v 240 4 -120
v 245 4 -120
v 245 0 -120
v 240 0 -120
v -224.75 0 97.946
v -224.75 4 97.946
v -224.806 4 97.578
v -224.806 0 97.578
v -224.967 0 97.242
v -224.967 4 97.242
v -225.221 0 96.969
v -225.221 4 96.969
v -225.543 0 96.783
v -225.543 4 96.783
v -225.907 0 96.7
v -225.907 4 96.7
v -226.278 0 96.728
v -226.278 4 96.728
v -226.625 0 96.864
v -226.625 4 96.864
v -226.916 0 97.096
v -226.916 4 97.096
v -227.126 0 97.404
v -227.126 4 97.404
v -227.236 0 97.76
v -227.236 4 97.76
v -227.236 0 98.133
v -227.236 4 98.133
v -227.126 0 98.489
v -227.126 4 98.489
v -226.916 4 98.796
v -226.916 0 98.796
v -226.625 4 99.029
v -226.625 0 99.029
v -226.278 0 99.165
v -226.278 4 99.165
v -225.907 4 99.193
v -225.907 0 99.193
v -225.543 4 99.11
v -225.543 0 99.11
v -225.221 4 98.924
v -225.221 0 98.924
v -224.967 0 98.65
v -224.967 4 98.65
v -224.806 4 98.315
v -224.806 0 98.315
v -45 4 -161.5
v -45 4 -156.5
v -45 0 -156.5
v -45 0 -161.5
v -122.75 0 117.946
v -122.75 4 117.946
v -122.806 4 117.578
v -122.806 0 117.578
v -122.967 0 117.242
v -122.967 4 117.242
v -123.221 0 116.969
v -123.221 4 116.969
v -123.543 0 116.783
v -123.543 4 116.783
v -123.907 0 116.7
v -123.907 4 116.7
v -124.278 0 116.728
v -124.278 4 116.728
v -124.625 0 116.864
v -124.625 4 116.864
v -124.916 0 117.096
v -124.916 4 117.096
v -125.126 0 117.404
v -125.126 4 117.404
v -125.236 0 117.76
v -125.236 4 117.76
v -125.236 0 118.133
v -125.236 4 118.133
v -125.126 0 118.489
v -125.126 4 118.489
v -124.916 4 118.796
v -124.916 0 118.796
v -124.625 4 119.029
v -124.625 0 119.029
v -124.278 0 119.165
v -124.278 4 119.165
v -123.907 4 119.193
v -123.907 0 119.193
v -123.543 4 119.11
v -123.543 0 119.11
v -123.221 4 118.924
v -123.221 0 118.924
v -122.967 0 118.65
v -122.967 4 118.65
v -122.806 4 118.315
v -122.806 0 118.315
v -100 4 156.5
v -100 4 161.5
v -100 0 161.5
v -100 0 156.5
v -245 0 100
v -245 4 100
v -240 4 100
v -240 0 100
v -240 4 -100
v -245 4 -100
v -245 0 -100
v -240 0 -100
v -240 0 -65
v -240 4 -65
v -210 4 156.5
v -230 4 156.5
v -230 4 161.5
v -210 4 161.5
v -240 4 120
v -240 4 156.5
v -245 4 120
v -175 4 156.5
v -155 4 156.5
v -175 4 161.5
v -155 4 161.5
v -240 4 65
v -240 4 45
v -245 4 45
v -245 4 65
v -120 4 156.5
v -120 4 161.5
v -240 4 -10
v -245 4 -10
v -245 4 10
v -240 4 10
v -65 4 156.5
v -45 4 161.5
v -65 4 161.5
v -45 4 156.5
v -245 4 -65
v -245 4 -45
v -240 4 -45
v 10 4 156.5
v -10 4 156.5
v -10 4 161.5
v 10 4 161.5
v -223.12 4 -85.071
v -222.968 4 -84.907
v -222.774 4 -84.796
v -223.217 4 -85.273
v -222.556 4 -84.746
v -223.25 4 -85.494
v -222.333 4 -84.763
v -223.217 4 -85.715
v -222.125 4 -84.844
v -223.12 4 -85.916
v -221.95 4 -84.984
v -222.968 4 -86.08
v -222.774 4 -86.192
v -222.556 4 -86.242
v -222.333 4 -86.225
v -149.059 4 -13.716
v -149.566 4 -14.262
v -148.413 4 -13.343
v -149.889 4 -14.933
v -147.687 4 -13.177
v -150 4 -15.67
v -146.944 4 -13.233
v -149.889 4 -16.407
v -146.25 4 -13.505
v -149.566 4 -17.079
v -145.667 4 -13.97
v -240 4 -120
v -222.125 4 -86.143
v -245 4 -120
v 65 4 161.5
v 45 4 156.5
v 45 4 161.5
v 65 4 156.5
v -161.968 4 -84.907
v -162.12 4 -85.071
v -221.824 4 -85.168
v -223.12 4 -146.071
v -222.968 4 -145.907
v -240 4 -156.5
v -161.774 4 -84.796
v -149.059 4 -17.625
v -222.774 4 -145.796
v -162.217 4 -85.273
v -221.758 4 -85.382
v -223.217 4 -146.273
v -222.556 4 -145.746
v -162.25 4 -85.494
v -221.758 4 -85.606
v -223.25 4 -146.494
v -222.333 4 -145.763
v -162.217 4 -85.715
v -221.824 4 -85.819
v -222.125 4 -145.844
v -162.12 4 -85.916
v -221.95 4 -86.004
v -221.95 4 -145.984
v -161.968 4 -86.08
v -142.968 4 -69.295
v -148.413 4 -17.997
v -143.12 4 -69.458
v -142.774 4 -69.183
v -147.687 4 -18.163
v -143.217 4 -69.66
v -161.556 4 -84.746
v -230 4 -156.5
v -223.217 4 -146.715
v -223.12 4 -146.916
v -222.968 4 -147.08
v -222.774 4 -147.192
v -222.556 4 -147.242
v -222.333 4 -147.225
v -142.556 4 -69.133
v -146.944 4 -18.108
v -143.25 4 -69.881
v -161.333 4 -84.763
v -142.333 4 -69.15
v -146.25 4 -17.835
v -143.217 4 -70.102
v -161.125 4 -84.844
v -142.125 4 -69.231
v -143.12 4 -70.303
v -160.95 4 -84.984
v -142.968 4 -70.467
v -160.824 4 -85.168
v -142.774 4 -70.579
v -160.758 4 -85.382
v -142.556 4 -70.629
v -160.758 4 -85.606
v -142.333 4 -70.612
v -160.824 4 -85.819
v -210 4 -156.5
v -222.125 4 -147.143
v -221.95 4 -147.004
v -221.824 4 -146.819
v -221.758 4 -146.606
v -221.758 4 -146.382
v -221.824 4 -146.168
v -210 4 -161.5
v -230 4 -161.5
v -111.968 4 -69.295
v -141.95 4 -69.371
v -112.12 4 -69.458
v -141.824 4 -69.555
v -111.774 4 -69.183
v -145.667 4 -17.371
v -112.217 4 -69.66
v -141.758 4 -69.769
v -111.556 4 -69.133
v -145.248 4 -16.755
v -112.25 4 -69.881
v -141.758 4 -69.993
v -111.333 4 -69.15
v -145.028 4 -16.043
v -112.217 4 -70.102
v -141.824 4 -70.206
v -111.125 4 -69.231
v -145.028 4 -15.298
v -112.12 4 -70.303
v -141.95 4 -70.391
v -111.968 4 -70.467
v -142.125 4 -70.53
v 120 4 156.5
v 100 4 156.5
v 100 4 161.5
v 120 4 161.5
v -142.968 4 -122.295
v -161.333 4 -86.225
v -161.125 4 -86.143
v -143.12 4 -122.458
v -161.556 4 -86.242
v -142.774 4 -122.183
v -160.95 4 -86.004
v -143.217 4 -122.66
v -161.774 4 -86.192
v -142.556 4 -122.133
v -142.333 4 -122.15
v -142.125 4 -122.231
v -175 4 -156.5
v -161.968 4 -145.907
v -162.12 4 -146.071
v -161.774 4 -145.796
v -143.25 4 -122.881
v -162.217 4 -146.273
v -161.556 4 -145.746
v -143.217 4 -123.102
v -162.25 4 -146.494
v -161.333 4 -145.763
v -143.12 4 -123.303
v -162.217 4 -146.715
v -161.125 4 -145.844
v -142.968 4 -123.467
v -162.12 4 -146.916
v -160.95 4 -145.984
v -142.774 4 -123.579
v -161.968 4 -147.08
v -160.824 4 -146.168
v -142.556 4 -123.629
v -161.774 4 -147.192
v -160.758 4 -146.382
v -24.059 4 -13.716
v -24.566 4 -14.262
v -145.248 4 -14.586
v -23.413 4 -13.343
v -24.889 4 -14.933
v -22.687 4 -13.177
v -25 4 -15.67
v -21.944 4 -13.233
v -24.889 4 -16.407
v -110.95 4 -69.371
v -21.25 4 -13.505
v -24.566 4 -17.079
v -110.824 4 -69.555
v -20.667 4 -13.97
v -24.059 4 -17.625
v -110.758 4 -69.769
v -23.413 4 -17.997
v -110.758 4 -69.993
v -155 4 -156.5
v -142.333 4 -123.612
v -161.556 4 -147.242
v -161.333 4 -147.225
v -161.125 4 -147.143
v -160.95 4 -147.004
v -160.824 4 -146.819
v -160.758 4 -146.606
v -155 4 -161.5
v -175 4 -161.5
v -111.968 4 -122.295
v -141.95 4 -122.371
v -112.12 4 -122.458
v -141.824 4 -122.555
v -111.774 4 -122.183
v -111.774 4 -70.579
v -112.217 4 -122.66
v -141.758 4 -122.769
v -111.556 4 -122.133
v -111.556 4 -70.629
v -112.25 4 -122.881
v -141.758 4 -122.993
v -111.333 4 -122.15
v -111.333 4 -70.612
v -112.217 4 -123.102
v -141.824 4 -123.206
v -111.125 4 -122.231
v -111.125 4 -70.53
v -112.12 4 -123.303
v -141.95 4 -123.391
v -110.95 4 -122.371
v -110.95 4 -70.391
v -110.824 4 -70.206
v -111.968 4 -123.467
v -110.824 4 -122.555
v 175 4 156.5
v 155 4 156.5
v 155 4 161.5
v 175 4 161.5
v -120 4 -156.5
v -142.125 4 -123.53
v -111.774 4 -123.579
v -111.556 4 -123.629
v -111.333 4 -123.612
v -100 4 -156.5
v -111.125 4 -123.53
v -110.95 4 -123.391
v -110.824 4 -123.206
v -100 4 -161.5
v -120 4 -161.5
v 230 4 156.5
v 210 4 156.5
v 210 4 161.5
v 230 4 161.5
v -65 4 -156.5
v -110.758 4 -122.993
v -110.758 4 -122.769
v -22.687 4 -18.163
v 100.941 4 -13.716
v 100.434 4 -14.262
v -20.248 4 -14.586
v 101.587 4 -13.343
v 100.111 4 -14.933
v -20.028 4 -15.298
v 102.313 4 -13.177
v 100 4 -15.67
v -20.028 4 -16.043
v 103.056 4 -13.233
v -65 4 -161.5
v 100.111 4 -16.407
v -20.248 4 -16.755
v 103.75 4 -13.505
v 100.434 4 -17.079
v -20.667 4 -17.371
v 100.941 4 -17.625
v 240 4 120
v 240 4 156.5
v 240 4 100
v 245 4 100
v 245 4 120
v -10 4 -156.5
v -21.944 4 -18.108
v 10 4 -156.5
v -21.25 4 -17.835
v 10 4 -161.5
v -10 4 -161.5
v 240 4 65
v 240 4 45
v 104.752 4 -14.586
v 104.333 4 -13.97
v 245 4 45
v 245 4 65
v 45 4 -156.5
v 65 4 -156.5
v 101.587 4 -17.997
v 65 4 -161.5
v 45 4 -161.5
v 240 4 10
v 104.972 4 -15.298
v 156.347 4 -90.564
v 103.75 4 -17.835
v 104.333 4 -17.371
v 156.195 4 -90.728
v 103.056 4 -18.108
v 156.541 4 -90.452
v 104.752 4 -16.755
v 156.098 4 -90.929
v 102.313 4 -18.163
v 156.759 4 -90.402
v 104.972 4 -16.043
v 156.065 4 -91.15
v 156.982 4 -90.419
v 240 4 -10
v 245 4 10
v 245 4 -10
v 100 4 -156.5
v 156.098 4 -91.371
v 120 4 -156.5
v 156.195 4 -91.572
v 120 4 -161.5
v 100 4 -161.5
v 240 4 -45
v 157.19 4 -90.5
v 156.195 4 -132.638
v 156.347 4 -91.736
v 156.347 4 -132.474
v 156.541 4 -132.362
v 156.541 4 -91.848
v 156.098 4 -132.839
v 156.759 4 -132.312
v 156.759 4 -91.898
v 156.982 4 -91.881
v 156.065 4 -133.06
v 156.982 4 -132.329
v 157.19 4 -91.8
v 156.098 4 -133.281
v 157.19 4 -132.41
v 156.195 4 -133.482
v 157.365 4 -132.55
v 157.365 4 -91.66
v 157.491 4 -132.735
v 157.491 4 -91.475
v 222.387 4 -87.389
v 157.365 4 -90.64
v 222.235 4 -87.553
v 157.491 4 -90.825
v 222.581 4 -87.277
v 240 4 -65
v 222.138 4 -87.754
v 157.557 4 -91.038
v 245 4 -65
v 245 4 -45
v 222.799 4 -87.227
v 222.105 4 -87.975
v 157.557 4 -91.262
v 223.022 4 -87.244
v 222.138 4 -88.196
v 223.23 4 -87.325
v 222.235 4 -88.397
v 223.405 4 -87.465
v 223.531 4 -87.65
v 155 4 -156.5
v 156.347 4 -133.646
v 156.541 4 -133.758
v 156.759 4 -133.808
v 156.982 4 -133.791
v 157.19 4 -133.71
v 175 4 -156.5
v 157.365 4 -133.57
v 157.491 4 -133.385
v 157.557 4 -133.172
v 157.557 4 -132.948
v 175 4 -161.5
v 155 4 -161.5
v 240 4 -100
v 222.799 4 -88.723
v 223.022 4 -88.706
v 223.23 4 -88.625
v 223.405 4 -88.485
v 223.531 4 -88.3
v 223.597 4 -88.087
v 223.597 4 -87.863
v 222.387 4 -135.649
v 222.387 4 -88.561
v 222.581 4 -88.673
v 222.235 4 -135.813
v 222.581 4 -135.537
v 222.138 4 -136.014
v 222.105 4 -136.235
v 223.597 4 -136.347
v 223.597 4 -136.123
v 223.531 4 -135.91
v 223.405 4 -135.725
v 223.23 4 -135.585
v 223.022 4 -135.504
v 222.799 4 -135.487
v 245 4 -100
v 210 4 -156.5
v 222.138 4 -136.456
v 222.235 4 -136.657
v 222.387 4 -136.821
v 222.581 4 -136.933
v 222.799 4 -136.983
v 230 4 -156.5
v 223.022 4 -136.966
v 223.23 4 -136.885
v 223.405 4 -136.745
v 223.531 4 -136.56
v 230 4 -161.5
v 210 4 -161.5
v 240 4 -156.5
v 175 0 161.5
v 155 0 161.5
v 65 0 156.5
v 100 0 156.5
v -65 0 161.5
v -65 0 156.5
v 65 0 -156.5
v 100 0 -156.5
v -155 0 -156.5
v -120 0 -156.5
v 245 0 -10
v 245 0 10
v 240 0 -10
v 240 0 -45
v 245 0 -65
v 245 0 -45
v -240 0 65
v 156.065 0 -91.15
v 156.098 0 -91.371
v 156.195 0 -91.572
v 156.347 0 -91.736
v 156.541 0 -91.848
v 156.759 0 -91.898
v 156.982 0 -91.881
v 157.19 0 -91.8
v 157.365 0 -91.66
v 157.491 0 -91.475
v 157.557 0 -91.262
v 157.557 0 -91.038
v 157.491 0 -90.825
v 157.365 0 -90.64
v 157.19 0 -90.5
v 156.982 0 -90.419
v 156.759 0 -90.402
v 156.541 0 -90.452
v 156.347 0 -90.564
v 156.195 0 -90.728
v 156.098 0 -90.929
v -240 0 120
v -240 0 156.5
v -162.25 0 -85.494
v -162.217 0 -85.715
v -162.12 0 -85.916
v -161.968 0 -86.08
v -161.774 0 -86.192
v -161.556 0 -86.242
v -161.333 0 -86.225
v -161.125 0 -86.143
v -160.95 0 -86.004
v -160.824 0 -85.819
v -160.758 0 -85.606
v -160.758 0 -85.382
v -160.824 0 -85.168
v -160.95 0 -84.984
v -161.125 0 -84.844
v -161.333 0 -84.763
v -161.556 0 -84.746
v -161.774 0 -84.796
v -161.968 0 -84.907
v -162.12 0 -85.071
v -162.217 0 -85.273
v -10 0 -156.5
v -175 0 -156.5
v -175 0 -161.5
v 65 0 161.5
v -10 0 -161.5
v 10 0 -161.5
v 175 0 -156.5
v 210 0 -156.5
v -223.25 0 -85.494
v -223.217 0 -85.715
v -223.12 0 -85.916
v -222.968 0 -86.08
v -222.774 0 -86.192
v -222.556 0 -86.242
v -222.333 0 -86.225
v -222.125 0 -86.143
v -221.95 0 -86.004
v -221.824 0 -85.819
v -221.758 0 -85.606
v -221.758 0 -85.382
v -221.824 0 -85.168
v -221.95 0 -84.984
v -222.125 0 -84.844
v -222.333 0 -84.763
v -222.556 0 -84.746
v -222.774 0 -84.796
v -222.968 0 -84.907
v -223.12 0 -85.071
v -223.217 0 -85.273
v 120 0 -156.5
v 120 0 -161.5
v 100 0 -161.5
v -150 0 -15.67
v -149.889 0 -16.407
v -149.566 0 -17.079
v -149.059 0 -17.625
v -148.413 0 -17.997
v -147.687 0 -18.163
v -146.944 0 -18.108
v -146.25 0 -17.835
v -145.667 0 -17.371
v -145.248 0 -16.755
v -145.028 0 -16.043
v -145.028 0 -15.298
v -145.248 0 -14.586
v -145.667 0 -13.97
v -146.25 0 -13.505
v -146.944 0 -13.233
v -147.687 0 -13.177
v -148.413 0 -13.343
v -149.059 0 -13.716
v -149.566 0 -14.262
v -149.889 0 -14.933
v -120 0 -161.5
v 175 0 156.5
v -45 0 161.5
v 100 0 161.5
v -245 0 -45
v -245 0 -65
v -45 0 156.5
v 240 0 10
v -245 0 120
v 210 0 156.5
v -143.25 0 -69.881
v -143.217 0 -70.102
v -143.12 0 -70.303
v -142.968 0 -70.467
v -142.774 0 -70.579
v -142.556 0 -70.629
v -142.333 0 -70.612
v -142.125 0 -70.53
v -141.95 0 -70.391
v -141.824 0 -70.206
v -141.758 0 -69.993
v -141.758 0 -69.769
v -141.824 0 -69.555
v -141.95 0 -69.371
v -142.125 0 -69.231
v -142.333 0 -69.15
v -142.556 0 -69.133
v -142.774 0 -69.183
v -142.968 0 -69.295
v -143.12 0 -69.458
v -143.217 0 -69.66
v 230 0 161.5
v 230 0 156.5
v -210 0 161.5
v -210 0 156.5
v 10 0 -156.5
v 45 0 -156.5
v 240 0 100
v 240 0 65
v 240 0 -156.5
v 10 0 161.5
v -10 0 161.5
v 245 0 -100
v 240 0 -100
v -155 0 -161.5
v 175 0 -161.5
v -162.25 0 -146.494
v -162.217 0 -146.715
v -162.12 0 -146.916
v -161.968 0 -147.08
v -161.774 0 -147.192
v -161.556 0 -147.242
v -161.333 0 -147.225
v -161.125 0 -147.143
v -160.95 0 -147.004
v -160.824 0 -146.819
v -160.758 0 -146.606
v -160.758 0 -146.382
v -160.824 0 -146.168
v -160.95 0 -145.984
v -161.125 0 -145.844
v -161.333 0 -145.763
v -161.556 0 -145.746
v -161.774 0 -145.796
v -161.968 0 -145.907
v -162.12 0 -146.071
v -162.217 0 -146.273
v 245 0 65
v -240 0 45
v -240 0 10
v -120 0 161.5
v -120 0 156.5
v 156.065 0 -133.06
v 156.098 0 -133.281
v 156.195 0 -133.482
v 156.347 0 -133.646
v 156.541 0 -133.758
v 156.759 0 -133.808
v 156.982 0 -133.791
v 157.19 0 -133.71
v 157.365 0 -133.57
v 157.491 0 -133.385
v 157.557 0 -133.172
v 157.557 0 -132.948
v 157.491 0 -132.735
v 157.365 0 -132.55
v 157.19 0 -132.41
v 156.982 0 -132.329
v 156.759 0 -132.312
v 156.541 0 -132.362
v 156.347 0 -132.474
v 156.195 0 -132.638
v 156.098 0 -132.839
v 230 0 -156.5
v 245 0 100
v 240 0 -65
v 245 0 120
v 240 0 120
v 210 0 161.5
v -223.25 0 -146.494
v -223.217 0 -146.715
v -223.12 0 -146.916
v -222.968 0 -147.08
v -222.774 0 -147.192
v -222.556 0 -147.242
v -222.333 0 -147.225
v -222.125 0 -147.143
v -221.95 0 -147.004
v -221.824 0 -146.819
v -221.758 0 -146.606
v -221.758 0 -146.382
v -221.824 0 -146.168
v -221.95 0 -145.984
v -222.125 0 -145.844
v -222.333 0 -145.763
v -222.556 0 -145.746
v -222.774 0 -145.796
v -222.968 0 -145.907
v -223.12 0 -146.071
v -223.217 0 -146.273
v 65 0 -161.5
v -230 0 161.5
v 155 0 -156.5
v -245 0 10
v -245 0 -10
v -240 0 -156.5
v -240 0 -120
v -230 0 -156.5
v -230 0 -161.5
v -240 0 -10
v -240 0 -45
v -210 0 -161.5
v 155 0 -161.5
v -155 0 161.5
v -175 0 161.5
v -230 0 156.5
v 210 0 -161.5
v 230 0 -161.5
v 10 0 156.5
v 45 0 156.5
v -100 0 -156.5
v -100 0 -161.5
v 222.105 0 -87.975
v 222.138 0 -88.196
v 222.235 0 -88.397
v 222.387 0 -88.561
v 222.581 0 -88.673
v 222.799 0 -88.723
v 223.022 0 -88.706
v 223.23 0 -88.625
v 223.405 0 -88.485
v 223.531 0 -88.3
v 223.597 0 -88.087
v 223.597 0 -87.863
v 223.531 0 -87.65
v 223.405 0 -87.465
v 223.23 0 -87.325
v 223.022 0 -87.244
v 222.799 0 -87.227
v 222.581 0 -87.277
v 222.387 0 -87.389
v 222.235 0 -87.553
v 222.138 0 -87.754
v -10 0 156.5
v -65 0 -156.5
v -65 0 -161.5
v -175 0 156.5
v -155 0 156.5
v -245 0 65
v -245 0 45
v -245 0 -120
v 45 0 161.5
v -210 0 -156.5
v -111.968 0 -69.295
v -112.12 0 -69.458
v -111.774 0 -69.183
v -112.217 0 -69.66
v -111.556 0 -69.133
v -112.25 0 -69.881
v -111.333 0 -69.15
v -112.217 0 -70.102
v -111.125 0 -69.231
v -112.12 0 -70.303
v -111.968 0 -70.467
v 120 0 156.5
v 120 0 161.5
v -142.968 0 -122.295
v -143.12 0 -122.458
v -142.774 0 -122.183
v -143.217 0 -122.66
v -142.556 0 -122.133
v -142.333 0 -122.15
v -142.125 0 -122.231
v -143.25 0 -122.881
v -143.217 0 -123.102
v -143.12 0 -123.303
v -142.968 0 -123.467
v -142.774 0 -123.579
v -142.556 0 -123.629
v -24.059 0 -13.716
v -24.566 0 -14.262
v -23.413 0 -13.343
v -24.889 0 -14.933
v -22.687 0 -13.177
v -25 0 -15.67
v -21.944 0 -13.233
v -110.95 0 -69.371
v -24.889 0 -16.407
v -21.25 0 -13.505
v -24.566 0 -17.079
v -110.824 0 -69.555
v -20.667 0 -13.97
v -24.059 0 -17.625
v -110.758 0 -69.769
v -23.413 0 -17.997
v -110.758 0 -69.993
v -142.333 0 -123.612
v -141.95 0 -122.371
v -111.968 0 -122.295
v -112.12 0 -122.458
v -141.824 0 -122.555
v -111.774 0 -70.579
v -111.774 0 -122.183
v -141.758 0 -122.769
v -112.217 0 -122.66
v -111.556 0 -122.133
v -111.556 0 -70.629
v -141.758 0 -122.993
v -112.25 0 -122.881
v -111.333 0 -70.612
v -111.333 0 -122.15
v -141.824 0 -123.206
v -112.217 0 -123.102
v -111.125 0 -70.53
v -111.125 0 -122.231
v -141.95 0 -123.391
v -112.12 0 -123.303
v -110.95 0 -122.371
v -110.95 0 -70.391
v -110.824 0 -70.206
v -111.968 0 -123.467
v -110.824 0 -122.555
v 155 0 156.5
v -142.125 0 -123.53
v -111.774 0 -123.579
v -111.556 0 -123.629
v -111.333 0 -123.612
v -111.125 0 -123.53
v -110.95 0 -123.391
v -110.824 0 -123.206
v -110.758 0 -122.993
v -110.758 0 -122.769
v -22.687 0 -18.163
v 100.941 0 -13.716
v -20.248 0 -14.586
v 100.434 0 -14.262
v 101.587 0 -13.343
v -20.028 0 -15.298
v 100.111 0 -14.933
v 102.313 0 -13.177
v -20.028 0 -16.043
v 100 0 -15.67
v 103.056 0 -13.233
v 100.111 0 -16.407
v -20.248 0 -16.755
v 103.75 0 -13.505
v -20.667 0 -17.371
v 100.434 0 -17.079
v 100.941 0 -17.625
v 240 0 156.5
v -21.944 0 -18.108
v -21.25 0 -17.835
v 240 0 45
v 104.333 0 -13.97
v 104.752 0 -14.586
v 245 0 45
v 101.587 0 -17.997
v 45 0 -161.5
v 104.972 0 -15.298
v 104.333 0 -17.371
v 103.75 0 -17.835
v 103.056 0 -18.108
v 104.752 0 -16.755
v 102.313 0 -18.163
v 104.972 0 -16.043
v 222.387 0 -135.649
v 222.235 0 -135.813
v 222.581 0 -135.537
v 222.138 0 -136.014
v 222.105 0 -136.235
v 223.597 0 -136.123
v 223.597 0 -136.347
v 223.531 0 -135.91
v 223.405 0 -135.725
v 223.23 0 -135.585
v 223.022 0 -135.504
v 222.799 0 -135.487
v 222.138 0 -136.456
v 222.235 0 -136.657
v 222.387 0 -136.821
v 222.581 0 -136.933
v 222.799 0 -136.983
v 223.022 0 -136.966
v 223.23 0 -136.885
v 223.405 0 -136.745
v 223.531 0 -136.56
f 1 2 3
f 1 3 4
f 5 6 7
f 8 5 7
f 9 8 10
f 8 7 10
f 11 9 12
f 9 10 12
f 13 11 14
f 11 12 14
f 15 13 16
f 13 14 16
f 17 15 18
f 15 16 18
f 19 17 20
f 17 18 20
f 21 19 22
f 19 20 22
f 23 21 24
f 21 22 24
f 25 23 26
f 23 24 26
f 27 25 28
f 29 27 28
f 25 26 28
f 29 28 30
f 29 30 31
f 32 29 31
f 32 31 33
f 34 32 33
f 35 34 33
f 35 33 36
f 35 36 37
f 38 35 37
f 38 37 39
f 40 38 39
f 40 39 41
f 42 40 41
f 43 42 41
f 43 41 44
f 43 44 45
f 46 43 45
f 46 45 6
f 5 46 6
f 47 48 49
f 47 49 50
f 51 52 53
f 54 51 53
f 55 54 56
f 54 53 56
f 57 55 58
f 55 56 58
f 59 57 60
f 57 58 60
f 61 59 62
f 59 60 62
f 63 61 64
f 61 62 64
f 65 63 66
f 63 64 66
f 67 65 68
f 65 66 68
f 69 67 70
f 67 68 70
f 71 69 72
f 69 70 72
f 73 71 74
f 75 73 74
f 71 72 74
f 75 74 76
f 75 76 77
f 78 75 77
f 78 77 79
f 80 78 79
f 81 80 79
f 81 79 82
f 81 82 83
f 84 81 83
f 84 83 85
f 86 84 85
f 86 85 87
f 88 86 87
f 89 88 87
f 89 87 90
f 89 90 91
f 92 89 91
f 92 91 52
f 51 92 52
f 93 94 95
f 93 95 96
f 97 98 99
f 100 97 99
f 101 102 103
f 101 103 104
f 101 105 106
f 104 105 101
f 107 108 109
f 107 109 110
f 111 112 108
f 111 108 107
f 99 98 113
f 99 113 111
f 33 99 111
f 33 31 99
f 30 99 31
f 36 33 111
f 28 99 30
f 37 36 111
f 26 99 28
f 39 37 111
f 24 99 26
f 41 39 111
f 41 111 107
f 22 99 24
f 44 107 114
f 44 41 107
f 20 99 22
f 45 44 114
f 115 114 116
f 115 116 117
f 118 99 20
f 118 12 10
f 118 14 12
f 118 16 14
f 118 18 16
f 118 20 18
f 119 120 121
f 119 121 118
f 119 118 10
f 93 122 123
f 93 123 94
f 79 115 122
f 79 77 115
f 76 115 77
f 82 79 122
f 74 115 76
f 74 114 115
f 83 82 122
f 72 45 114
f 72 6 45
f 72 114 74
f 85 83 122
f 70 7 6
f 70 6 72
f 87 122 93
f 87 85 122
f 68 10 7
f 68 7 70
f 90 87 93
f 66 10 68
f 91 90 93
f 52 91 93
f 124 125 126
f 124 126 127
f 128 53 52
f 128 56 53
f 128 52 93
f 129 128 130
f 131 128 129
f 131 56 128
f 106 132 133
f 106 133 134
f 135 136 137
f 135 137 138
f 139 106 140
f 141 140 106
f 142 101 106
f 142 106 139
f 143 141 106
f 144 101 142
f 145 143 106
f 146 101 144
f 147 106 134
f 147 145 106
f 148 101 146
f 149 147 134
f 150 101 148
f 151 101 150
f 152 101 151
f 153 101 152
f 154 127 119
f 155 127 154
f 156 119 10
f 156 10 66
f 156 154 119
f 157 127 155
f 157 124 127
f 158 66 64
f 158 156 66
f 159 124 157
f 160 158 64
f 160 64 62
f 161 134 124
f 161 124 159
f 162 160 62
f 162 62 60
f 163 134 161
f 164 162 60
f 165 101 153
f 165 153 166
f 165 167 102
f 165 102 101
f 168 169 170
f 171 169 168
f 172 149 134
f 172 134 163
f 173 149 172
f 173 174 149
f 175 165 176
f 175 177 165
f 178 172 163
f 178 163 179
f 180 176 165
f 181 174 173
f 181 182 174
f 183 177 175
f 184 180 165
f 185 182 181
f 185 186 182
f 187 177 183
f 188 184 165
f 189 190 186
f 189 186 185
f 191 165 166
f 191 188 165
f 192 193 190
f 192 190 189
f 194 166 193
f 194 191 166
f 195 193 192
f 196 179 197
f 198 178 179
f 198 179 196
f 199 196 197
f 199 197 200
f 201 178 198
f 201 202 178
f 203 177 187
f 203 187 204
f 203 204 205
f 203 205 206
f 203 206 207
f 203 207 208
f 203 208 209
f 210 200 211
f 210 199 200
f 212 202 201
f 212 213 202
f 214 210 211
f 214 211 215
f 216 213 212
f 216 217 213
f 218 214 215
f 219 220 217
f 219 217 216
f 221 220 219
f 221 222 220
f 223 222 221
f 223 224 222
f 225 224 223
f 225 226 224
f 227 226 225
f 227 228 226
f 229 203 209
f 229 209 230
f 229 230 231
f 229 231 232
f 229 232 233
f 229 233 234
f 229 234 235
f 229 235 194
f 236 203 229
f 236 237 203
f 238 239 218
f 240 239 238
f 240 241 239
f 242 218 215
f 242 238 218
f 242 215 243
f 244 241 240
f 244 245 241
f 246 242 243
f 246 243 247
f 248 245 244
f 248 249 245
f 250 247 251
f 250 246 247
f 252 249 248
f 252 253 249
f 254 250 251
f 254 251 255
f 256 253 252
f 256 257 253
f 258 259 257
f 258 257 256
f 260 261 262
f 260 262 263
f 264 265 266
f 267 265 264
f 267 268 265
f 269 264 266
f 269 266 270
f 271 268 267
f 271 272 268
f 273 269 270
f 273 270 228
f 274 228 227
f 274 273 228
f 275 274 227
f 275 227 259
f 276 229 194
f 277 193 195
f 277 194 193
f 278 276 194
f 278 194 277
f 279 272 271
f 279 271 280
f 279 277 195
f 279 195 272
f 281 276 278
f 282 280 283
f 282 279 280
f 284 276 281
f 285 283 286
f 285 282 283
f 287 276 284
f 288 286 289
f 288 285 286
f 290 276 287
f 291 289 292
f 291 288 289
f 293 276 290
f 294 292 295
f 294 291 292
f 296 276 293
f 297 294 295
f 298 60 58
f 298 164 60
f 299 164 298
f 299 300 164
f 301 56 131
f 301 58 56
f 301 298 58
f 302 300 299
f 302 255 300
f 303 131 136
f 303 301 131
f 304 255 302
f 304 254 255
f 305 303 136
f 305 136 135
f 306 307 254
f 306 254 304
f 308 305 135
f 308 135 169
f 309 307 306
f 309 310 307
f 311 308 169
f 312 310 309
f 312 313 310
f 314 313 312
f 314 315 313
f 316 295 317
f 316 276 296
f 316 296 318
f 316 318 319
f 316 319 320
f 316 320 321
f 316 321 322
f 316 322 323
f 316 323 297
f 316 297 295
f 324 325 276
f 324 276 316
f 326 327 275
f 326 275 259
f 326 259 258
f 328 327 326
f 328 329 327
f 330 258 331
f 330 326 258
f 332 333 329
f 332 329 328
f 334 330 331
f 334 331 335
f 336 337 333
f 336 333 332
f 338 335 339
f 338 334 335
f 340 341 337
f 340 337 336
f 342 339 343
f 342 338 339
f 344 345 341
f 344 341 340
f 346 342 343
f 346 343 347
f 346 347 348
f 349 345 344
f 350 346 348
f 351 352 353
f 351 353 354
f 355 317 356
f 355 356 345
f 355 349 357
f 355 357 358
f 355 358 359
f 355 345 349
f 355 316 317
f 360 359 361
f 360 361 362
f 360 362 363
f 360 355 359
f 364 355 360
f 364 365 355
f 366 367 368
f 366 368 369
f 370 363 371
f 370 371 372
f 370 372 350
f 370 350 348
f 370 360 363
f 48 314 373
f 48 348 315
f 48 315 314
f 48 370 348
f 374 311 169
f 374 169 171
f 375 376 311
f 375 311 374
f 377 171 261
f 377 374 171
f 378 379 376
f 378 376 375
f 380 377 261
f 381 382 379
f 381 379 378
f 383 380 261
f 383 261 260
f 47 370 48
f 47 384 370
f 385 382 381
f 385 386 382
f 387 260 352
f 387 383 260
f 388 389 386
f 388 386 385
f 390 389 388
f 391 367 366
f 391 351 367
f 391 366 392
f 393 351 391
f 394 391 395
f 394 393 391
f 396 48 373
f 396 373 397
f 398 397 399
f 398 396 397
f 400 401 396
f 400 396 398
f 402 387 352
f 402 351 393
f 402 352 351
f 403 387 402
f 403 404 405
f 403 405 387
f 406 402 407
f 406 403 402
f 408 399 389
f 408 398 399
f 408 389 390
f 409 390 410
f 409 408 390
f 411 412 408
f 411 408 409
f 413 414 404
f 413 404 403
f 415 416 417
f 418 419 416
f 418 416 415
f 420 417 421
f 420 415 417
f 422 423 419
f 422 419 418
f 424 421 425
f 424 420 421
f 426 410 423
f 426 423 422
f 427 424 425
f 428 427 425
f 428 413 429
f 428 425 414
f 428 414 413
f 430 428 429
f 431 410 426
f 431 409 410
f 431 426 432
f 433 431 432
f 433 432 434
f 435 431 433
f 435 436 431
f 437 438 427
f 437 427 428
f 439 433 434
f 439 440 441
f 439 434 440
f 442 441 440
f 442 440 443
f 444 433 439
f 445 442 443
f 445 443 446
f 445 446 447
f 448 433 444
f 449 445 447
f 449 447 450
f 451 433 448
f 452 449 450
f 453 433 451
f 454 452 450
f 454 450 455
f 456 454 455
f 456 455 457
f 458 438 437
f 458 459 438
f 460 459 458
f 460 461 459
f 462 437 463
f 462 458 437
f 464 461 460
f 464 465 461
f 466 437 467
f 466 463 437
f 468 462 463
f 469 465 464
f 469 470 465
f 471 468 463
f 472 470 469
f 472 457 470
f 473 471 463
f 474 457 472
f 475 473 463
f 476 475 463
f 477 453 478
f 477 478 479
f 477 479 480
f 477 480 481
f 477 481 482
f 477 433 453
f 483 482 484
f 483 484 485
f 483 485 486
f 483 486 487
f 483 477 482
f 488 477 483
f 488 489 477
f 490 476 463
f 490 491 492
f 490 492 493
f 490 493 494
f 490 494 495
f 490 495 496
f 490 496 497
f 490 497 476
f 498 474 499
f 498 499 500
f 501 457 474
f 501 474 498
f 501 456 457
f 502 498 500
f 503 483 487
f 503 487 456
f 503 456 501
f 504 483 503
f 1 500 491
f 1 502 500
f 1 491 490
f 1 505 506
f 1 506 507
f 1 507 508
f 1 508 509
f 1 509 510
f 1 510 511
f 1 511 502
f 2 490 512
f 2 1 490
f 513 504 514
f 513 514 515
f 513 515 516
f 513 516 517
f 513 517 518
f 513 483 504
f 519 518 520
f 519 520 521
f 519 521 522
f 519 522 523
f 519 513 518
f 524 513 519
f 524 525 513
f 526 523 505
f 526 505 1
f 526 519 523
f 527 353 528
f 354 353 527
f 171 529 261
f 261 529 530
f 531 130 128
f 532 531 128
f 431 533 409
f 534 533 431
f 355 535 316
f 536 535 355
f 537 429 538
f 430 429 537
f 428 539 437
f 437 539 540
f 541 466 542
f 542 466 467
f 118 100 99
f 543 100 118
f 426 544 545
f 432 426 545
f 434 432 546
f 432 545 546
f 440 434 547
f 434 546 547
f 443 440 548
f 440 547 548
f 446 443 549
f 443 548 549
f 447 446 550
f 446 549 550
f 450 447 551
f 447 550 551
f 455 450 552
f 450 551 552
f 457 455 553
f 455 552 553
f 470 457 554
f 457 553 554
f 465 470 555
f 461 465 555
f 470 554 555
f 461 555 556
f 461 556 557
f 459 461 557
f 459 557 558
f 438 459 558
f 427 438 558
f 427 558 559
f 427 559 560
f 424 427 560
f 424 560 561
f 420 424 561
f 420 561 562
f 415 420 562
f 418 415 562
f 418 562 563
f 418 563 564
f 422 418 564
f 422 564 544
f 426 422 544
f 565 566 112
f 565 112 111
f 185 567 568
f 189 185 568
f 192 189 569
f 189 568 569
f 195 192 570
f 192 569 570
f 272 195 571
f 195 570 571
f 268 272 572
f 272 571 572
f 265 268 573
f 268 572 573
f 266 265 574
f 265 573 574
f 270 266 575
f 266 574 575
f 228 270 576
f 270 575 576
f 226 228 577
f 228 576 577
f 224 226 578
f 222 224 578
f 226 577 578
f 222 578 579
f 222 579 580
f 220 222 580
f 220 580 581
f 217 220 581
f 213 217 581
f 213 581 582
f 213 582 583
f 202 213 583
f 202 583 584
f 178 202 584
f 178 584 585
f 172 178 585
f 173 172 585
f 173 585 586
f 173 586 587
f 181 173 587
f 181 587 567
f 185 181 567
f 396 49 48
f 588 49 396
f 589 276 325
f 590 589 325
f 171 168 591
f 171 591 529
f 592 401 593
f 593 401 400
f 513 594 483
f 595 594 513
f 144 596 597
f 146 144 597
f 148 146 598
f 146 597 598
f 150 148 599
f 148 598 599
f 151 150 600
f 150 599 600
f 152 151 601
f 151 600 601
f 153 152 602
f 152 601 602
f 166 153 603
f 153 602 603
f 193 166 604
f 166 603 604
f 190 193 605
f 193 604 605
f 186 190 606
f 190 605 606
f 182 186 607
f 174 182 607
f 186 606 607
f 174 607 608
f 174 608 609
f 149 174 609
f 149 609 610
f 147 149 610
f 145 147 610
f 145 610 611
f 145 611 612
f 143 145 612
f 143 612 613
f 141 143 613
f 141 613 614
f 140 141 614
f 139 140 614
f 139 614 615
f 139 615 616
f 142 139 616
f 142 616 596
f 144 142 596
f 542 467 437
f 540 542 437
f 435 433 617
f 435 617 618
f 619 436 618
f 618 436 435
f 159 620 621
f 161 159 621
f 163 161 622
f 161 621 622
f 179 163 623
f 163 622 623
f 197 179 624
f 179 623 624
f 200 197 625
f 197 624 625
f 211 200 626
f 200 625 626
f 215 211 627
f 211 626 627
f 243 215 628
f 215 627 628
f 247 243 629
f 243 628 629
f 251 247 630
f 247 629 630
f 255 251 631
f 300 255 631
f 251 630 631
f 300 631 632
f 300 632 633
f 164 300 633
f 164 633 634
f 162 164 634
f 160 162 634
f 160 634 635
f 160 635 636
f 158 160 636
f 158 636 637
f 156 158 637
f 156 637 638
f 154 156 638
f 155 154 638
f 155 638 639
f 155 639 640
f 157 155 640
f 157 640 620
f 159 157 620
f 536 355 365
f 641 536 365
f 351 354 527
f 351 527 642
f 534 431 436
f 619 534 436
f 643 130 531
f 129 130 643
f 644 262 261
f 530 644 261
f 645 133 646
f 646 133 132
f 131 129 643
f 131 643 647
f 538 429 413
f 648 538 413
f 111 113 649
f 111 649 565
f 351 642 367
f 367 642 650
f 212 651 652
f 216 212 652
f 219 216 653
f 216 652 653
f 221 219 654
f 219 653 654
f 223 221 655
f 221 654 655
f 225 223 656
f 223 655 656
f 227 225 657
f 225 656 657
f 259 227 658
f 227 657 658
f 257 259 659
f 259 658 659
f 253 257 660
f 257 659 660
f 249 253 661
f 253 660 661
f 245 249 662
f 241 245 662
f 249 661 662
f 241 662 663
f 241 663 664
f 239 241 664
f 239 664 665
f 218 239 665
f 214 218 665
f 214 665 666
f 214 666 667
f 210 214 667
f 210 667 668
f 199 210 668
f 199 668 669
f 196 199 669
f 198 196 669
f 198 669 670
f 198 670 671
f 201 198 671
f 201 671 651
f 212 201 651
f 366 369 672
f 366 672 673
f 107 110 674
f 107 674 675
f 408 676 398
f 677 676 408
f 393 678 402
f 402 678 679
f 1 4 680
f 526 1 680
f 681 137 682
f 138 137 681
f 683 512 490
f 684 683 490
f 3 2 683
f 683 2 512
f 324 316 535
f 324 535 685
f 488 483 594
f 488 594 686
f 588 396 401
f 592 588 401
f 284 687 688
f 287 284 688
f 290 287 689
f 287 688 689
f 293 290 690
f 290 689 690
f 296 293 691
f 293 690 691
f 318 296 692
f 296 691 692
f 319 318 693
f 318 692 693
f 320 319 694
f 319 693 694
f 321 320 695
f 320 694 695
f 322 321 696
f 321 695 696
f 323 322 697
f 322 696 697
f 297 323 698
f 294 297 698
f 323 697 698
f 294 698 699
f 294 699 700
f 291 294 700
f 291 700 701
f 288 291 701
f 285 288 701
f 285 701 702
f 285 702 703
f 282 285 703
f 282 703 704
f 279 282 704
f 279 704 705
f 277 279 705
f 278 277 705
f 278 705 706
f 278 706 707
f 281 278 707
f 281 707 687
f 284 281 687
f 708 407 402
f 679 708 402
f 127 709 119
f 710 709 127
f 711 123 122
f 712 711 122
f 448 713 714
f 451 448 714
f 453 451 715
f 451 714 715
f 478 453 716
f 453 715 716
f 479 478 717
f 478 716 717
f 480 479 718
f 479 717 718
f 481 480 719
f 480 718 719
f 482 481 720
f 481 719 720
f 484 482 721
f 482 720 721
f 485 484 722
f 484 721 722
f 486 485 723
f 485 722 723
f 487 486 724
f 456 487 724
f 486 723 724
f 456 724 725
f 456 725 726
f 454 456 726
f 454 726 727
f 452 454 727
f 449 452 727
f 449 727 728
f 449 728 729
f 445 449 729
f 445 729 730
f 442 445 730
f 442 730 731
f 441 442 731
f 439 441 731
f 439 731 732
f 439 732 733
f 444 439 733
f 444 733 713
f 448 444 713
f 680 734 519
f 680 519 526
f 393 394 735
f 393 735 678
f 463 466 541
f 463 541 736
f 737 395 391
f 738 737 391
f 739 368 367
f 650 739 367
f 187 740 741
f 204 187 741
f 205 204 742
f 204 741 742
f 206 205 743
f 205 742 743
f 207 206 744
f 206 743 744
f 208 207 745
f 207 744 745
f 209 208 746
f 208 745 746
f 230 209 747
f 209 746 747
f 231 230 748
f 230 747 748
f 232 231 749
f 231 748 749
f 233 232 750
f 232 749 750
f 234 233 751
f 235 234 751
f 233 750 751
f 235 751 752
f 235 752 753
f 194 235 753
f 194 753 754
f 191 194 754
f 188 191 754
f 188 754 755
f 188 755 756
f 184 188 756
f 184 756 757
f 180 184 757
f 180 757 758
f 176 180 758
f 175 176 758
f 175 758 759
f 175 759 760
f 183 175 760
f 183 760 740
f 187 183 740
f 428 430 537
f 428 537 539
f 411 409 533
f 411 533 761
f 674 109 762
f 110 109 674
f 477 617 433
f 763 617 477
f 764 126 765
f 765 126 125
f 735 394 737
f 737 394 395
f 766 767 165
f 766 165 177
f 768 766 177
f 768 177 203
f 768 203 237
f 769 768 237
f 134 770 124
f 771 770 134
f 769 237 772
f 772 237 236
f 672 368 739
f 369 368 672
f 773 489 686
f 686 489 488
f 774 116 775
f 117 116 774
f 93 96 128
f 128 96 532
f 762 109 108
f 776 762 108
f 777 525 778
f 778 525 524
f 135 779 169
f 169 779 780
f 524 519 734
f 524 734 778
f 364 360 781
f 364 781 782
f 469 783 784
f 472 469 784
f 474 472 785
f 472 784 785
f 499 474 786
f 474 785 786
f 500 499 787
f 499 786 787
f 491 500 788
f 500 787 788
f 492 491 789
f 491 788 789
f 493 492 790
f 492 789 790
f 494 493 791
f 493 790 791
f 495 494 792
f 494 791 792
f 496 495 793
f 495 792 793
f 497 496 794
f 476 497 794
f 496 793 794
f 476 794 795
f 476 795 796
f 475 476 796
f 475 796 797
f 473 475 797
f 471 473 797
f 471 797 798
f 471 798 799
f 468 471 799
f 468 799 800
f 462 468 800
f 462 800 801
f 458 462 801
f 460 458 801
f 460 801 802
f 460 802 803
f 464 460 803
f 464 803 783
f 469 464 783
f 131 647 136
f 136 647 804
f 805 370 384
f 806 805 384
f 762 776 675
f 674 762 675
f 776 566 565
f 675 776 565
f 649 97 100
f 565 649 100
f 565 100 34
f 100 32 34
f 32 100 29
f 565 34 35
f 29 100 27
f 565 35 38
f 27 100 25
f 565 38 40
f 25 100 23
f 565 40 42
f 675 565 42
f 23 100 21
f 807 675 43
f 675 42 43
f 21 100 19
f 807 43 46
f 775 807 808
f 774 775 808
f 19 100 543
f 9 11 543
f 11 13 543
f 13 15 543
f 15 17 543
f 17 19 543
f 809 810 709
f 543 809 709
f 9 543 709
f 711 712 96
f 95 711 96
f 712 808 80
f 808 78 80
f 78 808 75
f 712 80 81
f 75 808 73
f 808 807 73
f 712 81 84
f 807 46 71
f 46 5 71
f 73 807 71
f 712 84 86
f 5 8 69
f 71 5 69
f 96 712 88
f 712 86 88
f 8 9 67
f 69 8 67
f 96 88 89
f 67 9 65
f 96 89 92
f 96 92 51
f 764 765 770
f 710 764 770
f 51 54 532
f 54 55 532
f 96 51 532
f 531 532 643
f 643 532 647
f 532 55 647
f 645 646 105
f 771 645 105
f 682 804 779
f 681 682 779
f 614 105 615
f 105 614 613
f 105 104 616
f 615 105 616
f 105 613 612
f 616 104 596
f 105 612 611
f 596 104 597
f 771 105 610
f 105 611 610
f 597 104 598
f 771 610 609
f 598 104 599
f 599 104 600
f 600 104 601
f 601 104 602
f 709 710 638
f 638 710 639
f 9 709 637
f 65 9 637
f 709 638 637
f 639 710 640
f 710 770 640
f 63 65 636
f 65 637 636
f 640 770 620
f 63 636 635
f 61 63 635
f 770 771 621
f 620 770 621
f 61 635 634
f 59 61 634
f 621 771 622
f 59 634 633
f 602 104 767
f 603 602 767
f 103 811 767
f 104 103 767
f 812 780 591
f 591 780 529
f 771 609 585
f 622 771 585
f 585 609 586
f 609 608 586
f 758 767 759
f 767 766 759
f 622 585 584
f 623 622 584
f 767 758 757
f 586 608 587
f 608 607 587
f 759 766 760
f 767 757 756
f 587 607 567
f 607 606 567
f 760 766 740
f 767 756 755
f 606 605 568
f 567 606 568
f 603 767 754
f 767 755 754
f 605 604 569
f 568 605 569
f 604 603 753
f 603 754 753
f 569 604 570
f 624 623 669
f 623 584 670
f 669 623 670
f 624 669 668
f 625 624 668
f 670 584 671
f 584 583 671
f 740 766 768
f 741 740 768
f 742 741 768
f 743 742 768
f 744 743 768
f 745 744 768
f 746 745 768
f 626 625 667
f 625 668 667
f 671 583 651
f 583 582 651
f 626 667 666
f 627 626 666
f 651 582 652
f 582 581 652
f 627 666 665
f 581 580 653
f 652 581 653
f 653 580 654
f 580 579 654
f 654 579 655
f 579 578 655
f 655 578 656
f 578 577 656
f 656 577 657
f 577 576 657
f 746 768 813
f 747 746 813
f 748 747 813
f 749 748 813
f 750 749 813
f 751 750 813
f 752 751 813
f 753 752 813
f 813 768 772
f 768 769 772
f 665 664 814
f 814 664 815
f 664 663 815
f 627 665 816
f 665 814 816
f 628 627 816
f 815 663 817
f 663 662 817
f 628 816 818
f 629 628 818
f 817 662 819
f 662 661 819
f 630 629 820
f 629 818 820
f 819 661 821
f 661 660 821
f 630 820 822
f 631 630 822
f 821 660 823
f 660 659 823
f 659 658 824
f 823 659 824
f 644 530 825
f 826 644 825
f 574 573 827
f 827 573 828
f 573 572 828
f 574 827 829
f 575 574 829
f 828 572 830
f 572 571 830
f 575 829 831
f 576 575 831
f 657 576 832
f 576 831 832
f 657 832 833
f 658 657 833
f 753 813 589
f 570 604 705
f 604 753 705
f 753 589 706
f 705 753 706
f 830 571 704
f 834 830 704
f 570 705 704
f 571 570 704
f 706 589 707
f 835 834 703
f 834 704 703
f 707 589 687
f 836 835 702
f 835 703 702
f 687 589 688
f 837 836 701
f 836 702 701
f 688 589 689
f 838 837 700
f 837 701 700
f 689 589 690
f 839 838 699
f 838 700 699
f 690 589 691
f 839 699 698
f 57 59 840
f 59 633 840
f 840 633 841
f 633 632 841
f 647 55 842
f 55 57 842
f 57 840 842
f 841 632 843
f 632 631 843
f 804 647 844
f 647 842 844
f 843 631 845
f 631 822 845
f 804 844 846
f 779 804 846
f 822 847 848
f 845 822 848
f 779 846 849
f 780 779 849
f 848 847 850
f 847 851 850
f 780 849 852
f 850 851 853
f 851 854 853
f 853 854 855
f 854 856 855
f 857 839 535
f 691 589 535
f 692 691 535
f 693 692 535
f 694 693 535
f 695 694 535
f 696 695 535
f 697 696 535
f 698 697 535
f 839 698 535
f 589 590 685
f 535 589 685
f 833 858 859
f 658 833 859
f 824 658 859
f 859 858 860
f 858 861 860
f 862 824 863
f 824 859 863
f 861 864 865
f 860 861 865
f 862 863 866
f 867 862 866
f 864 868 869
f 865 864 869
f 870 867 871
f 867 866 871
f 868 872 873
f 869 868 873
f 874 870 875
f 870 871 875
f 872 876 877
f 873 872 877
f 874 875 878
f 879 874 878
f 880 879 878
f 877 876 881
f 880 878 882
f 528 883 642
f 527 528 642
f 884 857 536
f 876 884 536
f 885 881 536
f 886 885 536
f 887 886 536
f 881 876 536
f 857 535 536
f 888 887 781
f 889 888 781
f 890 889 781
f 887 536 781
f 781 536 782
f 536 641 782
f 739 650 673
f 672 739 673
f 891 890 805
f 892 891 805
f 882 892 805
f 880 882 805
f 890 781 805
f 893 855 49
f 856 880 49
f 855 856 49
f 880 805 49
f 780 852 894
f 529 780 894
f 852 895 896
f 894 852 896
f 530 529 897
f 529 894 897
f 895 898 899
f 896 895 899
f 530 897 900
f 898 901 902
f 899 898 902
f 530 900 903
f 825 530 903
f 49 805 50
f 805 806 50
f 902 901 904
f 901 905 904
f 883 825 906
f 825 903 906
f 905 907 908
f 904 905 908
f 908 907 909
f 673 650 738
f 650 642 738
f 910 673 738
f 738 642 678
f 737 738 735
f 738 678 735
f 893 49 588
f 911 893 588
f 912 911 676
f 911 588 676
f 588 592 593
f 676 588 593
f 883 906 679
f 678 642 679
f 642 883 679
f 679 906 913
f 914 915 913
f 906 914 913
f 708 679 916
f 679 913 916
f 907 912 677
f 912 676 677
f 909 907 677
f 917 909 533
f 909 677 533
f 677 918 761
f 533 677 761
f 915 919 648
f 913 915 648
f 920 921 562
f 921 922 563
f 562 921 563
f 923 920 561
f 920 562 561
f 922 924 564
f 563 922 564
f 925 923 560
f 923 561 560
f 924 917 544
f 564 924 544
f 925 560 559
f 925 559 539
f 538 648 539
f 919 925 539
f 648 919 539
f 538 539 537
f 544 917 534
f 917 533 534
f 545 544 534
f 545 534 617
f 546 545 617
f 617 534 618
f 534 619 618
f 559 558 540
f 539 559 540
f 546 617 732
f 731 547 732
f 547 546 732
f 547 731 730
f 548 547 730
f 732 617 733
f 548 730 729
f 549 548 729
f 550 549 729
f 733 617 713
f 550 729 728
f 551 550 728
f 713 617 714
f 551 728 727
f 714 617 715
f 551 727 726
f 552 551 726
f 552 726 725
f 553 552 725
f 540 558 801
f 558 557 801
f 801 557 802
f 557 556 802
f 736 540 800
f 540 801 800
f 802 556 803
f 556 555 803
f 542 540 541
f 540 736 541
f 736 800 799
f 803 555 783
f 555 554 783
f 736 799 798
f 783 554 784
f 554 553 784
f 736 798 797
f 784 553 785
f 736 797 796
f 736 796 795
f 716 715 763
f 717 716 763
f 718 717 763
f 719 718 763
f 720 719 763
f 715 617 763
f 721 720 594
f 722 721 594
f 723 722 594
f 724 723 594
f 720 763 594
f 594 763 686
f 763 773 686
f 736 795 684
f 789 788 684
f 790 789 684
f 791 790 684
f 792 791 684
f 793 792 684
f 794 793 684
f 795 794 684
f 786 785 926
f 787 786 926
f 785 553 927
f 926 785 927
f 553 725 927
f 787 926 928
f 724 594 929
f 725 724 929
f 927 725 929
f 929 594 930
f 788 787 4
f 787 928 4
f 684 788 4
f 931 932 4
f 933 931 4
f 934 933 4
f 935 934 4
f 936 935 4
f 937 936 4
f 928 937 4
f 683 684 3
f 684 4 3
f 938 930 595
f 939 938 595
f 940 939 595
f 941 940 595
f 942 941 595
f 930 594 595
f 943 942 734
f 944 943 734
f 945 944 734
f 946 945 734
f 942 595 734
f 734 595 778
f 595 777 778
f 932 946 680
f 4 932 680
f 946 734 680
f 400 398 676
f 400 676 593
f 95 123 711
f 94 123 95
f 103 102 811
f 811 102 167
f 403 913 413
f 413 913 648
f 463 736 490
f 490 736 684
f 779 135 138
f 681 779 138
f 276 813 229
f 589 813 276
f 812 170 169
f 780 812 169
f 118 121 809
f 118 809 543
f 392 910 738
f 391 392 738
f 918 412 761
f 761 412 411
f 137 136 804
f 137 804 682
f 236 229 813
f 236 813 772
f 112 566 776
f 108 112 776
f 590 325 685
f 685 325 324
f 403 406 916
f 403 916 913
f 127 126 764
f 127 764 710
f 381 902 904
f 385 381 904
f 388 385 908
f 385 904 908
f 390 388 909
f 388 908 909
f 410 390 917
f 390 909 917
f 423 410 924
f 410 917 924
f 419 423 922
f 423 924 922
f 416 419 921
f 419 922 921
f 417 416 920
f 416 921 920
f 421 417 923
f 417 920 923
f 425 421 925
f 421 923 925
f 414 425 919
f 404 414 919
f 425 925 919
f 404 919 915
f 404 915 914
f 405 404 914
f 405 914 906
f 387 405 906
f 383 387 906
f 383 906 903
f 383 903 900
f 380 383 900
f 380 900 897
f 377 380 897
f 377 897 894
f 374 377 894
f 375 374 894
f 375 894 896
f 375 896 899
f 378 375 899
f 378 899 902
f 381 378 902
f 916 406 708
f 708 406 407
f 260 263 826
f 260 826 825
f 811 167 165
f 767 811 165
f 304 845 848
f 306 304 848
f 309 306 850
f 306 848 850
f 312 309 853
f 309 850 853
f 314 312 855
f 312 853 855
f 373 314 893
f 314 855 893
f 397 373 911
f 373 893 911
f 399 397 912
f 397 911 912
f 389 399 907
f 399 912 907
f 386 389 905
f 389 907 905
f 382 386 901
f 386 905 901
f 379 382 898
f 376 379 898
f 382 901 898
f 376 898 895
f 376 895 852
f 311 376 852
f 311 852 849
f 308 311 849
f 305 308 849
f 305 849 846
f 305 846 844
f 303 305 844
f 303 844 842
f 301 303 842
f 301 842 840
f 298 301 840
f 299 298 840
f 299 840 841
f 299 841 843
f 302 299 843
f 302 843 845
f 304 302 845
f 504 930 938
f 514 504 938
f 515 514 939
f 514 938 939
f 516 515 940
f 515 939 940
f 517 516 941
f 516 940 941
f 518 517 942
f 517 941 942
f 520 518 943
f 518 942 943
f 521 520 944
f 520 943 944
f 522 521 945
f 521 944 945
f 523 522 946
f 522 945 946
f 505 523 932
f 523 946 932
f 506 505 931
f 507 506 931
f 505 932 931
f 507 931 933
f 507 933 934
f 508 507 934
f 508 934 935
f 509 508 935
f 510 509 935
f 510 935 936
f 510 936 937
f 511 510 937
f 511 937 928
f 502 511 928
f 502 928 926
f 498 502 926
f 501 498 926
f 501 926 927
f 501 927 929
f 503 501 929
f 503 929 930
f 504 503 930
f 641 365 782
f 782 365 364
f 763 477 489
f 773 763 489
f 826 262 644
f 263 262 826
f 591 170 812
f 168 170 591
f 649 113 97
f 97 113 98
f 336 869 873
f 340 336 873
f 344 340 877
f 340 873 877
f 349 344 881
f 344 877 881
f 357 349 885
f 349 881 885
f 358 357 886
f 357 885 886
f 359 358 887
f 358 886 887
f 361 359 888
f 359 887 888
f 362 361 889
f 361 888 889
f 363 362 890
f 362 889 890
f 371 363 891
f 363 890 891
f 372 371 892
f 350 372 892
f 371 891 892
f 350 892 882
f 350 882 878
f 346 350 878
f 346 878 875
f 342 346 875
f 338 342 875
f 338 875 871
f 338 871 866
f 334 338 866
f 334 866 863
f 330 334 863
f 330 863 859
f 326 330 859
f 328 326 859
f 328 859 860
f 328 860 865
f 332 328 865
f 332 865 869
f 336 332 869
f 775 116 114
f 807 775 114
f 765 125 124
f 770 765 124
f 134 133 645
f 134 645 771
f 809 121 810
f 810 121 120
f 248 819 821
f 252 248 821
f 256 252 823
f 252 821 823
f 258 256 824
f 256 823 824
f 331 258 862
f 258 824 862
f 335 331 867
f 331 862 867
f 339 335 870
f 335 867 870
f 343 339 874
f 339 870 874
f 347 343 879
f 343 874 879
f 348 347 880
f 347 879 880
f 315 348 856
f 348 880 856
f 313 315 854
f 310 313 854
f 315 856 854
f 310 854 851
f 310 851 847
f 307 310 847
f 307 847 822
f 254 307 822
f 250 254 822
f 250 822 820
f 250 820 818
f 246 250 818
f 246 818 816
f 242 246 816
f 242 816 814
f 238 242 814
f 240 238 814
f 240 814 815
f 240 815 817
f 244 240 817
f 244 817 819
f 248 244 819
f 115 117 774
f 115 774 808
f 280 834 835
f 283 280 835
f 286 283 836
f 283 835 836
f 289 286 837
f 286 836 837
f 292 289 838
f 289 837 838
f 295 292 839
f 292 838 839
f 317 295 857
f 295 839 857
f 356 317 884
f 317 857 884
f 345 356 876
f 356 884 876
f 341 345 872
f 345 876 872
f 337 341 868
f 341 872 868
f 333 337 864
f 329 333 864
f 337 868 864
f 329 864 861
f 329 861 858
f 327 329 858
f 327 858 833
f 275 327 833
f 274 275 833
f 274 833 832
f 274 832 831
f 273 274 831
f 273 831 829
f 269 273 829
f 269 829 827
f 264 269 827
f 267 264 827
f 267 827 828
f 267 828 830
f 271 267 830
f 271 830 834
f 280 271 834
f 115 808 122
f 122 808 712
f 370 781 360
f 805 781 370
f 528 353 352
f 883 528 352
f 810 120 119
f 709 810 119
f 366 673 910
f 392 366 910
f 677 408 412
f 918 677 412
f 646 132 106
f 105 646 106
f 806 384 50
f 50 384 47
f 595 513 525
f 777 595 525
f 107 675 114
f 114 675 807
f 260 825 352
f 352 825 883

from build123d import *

# Parameters (mm, degrees)
SKETCH1_W                        = 480
SKETCH1_H                        = 313
BASE_DEPTH                       = 4
SKETCH2_W                        = 20
SKETCH2_H                        = 5
TOP_TABS_DEFINITION_DEPTH        = 4
TOP_TABS_PATTERN_COUNT           = 5
TOP_TABS_PATTERN_PITCH           = 55
TOP_TABS_PATTERN_COL_COUNT       = 5
TOP_TABS_PATTERN_COL_PITCH       = 55
BOTTOM_TABS_COPY_1_SKETCH_W      = 20
BOTTOM_TABS_COPY_1_SKETCH_H      = 5
BOTTOM_TABS_COPY_1_DEPTH         = 4
BOTTOM_TABS_COPY_2_SKETCH_W      = 20
BOTTOM_TABS_COPY_2_SKETCH_H      = 5
BOTTOM_TABS_COPY_2_DEPTH         = 4
BOTTOM_TABS_COPY_3_SKETCH_W      = 20
BOTTOM_TABS_COPY_3_SKETCH_H      = 5
BOTTOM_TABS_COPY_3_DEPTH         = 4
BOTTOM_TABS_COPY_4_SKETCH_W      = 20
BOTTOM_TABS_COPY_4_SKETCH_H      = 5
BOTTOM_TABS_COPY_4_DEPTH         = 4
BOTTOM_TABS_COPY_5_SKETCH_W      = 20
BOTTOM_TABS_COPY_5_SKETCH_H      = 5
BOTTOM_TABS_COPY_5_DEPTH         = 4
BOTTOM_TABS_COPY_6_SKETCH_W      = 20
BOTTOM_TABS_COPY_6_SKETCH_H      = 5
BOTTOM_TABS_COPY_6_DEPTH         = 4
BOTTOM_TABS_COPY_7_SKETCH_W      = 20
BOTTOM_TABS_COPY_7_SKETCH_H      = 5
BOTTOM_TABS_COPY_7_DEPTH         = 4
BOTTOM_TABS_COPY_8_SKETCH_W      = 20
BOTTOM_TABS_COPY_8_SKETCH_H      = 5
BOTTOM_TABS_COPY_8_DEPTH         = 4
ELECTRONICS_MOUNTING_HOLES_1_5_D = 1.5
SKETCH7_W                        = 5
SKETCH7_H                        = 20
LEFT_TABS_DEFINITION_DEPTH       = 4
LEFT_TABS_PATTERN_COUNT          = 3
LEFT_TABS_PATTERN_PITCH          = 55
LEFT_TABS_PATTERN_COL_COUNT      = 3
LEFT_TABS_PATTERN_COL_PITCH      = 55
RIGHT_TABS_COPY_1_SKETCH_W       = 5
RIGHT_TABS_COPY_1_SKETCH_H       = 20
RIGHT_TABS_COPY_1_DEPTH          = 4
RIGHT_TABS_COPY_2_SKETCH_W       = 5
RIGHT_TABS_COPY_2_SKETCH_H       = 20
RIGHT_TABS_COPY_2_DEPTH          = 4
RIGHT_TABS_COPY_3_SKETCH_W       = 5
RIGHT_TABS_COPY_3_SKETCH_H       = 20
RIGHT_TABS_COPY_3_DEPTH          = 4
RIGHT_TABS_COPY_4_SKETCH_W       = 5
RIGHT_TABS_COPY_4_SKETCH_H       = 20
RIGHT_TABS_COPY_4_DEPTH          = 4
M6_CLEARANCE_HOLE1_D             = 5
TAP_DRILL_FOR_M3X0_5_TAP1_D      = 2.5


with BuildPart() as part:
    # Sketch1 → Base (new body)
    with BuildSketch(Plane(origin=(0, 0, 0), x_dir=(1, 0, 0), z_dir=(0, 1, 0))):
        Rectangle(SKETCH1_W, SKETCH1_H)
    extrude(amount=BASE_DEPTH)

    # Sketch2 → Top Tabs Definition (add)
    with BuildSketch(Plane(origin=(0, 4, 0), x_dir=(1, 0, 0), z_dir=(0, 1, 0))):
        with Locations((0, 159)):
            Rectangle(SKETCH2_W, SKETCH2_H)
    top_tabs_definition = extrude(amount=-TOP_TABS_DEFINITION_DEPTH)

    # Top Tabs Pattern: Top Tabs Definition ×5
    with Locations(*[(-i * TOP_TABS_PATTERN_PITCH, 0, 0) for i in range(1, TOP_TABS_PATTERN_COUNT)]):
        add(top_tabs_definition)

    # Top Tabs Pattern col: Top Tabs Definition ×5
    with Locations(*[(i * TOP_TABS_PATTERN_COL_PITCH, 0, 0) for i in range(1, TOP_TABS_PATTERN_COL_COUNT)]):
        add(top_tabs_definition)

    # Bottom Tabs: Top Tabs Definition across plane
    add(top_tabs_definition.mirror(Plane.XY))

    # Bottom Tabs copy 1 sketch → Bottom Tabs copy 1 (add)
    with BuildSketch(Plane(origin=(-55, 4, 0), x_dir=(1, 0, 0), z_dir=(0, 1, 0))):
        with Locations((0, -159)):
            Rectangle(BOTTOM_TABS_COPY_1_SKETCH_W, BOTTOM_TABS_COPY_1_SKETCH_H)
    extrude(amount=-BOTTOM_TABS_COPY_1_DEPTH)

    # Bottom Tabs copy 2 sketch → Bottom Tabs copy 2 (add)
    with BuildSketch(Plane(origin=(-110, 4, 0), x_dir=(1, 0, 0), z_dir=(0, 1, 0))):
        with Locations((0, -159)):
            Rectangle(BOTTOM_TABS_COPY_2_SKETCH_W, BOTTOM_TABS_COPY_2_SKETCH_H)
    extrude(amount=-BOTTOM_TABS_COPY_2_DEPTH)

    # Bottom Tabs copy 3 sketch → Bottom Tabs copy 3 (add)
    with BuildSketch(Plane(origin=(-165, 4, 0), x_dir=(1, 0, 0), z_dir=(0, 1, 0))):
        with Locations((0, -159)):
            Rectangle(BOTTOM_TABS_COPY_3_SKETCH_W, BOTTOM_TABS_COPY_3_SKETCH_H)
    extrude(amount=-BOTTOM_TABS_COPY_3_DEPTH)

    # Bottom Tabs copy 4 sketch → Bottom Tabs copy 4 (add)
    with BuildSketch(Plane(origin=(-220, 4, 0), x_dir=(1, 0, 0), z_dir=(0, 1, 0))):
        with Locations((0, -159)):
            Rectangle(BOTTOM_TABS_COPY_4_SKETCH_W, BOTTOM_TABS_COPY_4_SKETCH_H)
    extrude(amount=-BOTTOM_TABS_COPY_4_DEPTH)

    # Bottom Tabs copy 5 sketch → Bottom Tabs copy 5 (add)
    with BuildSketch(Plane(origin=(55, 4, 0), x_dir=(1, 0, 0), z_dir=(0, 1, 0))):
        with Locations((0, -159)):
            Rectangle(BOTTOM_TABS_COPY_5_SKETCH_W, BOTTOM_TABS_COPY_5_SKETCH_H)
    extrude(amount=-BOTTOM_TABS_COPY_5_DEPTH)

    # Bottom Tabs copy 6 sketch → Bottom Tabs copy 6 (add)
    with BuildSketch(Plane(origin=(110, 4, 0), x_dir=(1, 0, 0), z_dir=(0, 1, 0))):
        with Locations((0, -159)):
            Rectangle(BOTTOM_TABS_COPY_6_SKETCH_W, BOTTOM_TABS_COPY_6_SKETCH_H)
    extrude(amount=-BOTTOM_TABS_COPY_6_DEPTH)

    # Bottom Tabs copy 7 sketch → Bottom Tabs copy 7 (add)
    with BuildSketch(Plane(origin=(165, 4, 0), x_dir=(1, 0, 0), z_dir=(0, 1, 0))):
        with Locations((0, -159)):
            Rectangle(BOTTOM_TABS_COPY_7_SKETCH_W, BOTTOM_TABS_COPY_7_SKETCH_H)
    extrude(amount=-BOTTOM_TABS_COPY_7_DEPTH)

    # Bottom Tabs copy 8 sketch → Bottom Tabs copy 8 (add)
    with BuildSketch(Plane(origin=(220, 4, 0), x_dir=(1, 0, 0), z_dir=(0, 1, 0))):
        with Locations((0, -159)):
            Rectangle(BOTTOM_TABS_COPY_8_SKETCH_W, BOTTOM_TABS_COPY_8_SKETCH_H)
    extrude(amount=-BOTTOM_TABS_COPY_8_DEPTH)

    # Electronics Mounting Holes (1.5) (through all)
    with Locations(Plane(origin=(0, 4, 0), x_dir=(1, 0, 0), z_dir=(0, 1, 0))):
        with Locations((-142.5, 122.880889181), (-111.5, 122.880889181), (-111.5, 69.880889181), (-142.5, 69.880889181), (-161.5, 85.493748074), (-161.5, 146.493748074), (-222.5, 146.493748074), (-222.5, 85.493748074), (156.815, 133.05999982), (222.855, 136.23499982), (222.855, 87.97499982), (156.815, 91.14999982)):
            Hole(ELECTRONICS_MOUNTING_HOLES_1_5_D / 2)

    # Sketch7 → Left Tabs Definition (add)
    with BuildSketch(Plane(origin=(0, 4, 0), x_dir=(1, 0, 0), z_dir=(0, 1, 0))):
        with Locations((-242.5, 0)):
            Rectangle(SKETCH7_W, SKETCH7_H)
    left_tabs_definition = extrude(amount=-LEFT_TABS_DEFINITION_DEPTH)

    # Left Tabs Pattern: Left Tabs Definition ×3
    with Locations(*[(0, 0, -i * LEFT_TABS_PATTERN_PITCH) for i in range(1, LEFT_TABS_PATTERN_COUNT)]):
        add(left_tabs_definition)

    # Left Tabs Pattern col: Left Tabs Definition ×3
    with Locations(*[(0, 0, i * LEFT_TABS_PATTERN_COL_PITCH) for i in range(1, LEFT_TABS_PATTERN_COL_COUNT)]):
        add(left_tabs_definition)

    # Right Tabs: Left Tabs Definition across plane
    add(left_tabs_definition.mirror(Plane(origin=(0, 0, 0), x_dir=(0, 0, 1), z_dir=(1, 0, 0))))

    # Right Tabs copy 1 sketch → Right Tabs copy 1 (add)
    with BuildSketch(Plane(origin=(0, 4, -55), x_dir=(-1, 0, 0), z_dir=(0, 1, 0))):
        with Locations((-242.5, 0)):
            Rectangle(RIGHT_TABS_COPY_1_SKETCH_W, RIGHT_TABS_COPY_1_SKETCH_H)
    extrude(amount=-RIGHT_TABS_COPY_1_DEPTH)

    # Right Tabs copy 2 sketch → Right Tabs copy 2 (add)
    with BuildSketch(Plane(origin=(0, 4, -110), x_dir=(-1, 0, 0), z_dir=(0, 1, 0))):
        with Locations((-242.5, 0)):
            Rectangle(RIGHT_TABS_COPY_2_SKETCH_W, RIGHT_TABS_COPY_2_SKETCH_H)
    extrude(amount=-RIGHT_TABS_COPY_2_DEPTH)

    # Right Tabs copy 3 sketch → Right Tabs copy 3 (add)
    with BuildSketch(Plane(origin=(0, 4, 55), x_dir=(-1, 0, 0), z_dir=(0, 1, 0))):
        with Locations((-242.5, 0)):
            Rectangle(RIGHT_TABS_COPY_3_SKETCH_W, RIGHT_TABS_COPY_3_SKETCH_H)
    extrude(amount=-RIGHT_TABS_COPY_3_DEPTH)

    # Right Tabs copy 4 sketch → Right Tabs copy 4 (add)
    with BuildSketch(Plane(origin=(0, 4, 110), x_dir=(-1, 0, 0), z_dir=(0, 1, 0))):
        with Locations((-242.5, 0)):
            Rectangle(RIGHT_TABS_COPY_4_SKETCH_W, RIGHT_TABS_COPY_4_SKETCH_H)
    extrude(amount=-RIGHT_TABS_COPY_4_DEPTH)

    # M6 Clearance Hole1 (through all)
    with Locations(Plane(origin=(0, 4, 0), x_dir=(1, 0, 0), z_dir=(0, 1, 0))):
        with Locations((-147.5, 15.670311787), (-22.5, 15.670311787), (102.5, 15.670311787)):
            Hole(M6_CLEARANCE_HOLE1_D / 2)

    # Tap Drill for M3x0.5 Tap1 (through all)
    with Locations(Plane(origin=(0, 0, 0), x_dir=(-1, 0, 0), z_dir=(0, -1, 0))):
        with Locations((124, -117.946251926), (226, -97.946251926)):
            Hole(TAP_DRILL_FOR_M3X0_5_TAP1_D / 2)


solid = part.part
